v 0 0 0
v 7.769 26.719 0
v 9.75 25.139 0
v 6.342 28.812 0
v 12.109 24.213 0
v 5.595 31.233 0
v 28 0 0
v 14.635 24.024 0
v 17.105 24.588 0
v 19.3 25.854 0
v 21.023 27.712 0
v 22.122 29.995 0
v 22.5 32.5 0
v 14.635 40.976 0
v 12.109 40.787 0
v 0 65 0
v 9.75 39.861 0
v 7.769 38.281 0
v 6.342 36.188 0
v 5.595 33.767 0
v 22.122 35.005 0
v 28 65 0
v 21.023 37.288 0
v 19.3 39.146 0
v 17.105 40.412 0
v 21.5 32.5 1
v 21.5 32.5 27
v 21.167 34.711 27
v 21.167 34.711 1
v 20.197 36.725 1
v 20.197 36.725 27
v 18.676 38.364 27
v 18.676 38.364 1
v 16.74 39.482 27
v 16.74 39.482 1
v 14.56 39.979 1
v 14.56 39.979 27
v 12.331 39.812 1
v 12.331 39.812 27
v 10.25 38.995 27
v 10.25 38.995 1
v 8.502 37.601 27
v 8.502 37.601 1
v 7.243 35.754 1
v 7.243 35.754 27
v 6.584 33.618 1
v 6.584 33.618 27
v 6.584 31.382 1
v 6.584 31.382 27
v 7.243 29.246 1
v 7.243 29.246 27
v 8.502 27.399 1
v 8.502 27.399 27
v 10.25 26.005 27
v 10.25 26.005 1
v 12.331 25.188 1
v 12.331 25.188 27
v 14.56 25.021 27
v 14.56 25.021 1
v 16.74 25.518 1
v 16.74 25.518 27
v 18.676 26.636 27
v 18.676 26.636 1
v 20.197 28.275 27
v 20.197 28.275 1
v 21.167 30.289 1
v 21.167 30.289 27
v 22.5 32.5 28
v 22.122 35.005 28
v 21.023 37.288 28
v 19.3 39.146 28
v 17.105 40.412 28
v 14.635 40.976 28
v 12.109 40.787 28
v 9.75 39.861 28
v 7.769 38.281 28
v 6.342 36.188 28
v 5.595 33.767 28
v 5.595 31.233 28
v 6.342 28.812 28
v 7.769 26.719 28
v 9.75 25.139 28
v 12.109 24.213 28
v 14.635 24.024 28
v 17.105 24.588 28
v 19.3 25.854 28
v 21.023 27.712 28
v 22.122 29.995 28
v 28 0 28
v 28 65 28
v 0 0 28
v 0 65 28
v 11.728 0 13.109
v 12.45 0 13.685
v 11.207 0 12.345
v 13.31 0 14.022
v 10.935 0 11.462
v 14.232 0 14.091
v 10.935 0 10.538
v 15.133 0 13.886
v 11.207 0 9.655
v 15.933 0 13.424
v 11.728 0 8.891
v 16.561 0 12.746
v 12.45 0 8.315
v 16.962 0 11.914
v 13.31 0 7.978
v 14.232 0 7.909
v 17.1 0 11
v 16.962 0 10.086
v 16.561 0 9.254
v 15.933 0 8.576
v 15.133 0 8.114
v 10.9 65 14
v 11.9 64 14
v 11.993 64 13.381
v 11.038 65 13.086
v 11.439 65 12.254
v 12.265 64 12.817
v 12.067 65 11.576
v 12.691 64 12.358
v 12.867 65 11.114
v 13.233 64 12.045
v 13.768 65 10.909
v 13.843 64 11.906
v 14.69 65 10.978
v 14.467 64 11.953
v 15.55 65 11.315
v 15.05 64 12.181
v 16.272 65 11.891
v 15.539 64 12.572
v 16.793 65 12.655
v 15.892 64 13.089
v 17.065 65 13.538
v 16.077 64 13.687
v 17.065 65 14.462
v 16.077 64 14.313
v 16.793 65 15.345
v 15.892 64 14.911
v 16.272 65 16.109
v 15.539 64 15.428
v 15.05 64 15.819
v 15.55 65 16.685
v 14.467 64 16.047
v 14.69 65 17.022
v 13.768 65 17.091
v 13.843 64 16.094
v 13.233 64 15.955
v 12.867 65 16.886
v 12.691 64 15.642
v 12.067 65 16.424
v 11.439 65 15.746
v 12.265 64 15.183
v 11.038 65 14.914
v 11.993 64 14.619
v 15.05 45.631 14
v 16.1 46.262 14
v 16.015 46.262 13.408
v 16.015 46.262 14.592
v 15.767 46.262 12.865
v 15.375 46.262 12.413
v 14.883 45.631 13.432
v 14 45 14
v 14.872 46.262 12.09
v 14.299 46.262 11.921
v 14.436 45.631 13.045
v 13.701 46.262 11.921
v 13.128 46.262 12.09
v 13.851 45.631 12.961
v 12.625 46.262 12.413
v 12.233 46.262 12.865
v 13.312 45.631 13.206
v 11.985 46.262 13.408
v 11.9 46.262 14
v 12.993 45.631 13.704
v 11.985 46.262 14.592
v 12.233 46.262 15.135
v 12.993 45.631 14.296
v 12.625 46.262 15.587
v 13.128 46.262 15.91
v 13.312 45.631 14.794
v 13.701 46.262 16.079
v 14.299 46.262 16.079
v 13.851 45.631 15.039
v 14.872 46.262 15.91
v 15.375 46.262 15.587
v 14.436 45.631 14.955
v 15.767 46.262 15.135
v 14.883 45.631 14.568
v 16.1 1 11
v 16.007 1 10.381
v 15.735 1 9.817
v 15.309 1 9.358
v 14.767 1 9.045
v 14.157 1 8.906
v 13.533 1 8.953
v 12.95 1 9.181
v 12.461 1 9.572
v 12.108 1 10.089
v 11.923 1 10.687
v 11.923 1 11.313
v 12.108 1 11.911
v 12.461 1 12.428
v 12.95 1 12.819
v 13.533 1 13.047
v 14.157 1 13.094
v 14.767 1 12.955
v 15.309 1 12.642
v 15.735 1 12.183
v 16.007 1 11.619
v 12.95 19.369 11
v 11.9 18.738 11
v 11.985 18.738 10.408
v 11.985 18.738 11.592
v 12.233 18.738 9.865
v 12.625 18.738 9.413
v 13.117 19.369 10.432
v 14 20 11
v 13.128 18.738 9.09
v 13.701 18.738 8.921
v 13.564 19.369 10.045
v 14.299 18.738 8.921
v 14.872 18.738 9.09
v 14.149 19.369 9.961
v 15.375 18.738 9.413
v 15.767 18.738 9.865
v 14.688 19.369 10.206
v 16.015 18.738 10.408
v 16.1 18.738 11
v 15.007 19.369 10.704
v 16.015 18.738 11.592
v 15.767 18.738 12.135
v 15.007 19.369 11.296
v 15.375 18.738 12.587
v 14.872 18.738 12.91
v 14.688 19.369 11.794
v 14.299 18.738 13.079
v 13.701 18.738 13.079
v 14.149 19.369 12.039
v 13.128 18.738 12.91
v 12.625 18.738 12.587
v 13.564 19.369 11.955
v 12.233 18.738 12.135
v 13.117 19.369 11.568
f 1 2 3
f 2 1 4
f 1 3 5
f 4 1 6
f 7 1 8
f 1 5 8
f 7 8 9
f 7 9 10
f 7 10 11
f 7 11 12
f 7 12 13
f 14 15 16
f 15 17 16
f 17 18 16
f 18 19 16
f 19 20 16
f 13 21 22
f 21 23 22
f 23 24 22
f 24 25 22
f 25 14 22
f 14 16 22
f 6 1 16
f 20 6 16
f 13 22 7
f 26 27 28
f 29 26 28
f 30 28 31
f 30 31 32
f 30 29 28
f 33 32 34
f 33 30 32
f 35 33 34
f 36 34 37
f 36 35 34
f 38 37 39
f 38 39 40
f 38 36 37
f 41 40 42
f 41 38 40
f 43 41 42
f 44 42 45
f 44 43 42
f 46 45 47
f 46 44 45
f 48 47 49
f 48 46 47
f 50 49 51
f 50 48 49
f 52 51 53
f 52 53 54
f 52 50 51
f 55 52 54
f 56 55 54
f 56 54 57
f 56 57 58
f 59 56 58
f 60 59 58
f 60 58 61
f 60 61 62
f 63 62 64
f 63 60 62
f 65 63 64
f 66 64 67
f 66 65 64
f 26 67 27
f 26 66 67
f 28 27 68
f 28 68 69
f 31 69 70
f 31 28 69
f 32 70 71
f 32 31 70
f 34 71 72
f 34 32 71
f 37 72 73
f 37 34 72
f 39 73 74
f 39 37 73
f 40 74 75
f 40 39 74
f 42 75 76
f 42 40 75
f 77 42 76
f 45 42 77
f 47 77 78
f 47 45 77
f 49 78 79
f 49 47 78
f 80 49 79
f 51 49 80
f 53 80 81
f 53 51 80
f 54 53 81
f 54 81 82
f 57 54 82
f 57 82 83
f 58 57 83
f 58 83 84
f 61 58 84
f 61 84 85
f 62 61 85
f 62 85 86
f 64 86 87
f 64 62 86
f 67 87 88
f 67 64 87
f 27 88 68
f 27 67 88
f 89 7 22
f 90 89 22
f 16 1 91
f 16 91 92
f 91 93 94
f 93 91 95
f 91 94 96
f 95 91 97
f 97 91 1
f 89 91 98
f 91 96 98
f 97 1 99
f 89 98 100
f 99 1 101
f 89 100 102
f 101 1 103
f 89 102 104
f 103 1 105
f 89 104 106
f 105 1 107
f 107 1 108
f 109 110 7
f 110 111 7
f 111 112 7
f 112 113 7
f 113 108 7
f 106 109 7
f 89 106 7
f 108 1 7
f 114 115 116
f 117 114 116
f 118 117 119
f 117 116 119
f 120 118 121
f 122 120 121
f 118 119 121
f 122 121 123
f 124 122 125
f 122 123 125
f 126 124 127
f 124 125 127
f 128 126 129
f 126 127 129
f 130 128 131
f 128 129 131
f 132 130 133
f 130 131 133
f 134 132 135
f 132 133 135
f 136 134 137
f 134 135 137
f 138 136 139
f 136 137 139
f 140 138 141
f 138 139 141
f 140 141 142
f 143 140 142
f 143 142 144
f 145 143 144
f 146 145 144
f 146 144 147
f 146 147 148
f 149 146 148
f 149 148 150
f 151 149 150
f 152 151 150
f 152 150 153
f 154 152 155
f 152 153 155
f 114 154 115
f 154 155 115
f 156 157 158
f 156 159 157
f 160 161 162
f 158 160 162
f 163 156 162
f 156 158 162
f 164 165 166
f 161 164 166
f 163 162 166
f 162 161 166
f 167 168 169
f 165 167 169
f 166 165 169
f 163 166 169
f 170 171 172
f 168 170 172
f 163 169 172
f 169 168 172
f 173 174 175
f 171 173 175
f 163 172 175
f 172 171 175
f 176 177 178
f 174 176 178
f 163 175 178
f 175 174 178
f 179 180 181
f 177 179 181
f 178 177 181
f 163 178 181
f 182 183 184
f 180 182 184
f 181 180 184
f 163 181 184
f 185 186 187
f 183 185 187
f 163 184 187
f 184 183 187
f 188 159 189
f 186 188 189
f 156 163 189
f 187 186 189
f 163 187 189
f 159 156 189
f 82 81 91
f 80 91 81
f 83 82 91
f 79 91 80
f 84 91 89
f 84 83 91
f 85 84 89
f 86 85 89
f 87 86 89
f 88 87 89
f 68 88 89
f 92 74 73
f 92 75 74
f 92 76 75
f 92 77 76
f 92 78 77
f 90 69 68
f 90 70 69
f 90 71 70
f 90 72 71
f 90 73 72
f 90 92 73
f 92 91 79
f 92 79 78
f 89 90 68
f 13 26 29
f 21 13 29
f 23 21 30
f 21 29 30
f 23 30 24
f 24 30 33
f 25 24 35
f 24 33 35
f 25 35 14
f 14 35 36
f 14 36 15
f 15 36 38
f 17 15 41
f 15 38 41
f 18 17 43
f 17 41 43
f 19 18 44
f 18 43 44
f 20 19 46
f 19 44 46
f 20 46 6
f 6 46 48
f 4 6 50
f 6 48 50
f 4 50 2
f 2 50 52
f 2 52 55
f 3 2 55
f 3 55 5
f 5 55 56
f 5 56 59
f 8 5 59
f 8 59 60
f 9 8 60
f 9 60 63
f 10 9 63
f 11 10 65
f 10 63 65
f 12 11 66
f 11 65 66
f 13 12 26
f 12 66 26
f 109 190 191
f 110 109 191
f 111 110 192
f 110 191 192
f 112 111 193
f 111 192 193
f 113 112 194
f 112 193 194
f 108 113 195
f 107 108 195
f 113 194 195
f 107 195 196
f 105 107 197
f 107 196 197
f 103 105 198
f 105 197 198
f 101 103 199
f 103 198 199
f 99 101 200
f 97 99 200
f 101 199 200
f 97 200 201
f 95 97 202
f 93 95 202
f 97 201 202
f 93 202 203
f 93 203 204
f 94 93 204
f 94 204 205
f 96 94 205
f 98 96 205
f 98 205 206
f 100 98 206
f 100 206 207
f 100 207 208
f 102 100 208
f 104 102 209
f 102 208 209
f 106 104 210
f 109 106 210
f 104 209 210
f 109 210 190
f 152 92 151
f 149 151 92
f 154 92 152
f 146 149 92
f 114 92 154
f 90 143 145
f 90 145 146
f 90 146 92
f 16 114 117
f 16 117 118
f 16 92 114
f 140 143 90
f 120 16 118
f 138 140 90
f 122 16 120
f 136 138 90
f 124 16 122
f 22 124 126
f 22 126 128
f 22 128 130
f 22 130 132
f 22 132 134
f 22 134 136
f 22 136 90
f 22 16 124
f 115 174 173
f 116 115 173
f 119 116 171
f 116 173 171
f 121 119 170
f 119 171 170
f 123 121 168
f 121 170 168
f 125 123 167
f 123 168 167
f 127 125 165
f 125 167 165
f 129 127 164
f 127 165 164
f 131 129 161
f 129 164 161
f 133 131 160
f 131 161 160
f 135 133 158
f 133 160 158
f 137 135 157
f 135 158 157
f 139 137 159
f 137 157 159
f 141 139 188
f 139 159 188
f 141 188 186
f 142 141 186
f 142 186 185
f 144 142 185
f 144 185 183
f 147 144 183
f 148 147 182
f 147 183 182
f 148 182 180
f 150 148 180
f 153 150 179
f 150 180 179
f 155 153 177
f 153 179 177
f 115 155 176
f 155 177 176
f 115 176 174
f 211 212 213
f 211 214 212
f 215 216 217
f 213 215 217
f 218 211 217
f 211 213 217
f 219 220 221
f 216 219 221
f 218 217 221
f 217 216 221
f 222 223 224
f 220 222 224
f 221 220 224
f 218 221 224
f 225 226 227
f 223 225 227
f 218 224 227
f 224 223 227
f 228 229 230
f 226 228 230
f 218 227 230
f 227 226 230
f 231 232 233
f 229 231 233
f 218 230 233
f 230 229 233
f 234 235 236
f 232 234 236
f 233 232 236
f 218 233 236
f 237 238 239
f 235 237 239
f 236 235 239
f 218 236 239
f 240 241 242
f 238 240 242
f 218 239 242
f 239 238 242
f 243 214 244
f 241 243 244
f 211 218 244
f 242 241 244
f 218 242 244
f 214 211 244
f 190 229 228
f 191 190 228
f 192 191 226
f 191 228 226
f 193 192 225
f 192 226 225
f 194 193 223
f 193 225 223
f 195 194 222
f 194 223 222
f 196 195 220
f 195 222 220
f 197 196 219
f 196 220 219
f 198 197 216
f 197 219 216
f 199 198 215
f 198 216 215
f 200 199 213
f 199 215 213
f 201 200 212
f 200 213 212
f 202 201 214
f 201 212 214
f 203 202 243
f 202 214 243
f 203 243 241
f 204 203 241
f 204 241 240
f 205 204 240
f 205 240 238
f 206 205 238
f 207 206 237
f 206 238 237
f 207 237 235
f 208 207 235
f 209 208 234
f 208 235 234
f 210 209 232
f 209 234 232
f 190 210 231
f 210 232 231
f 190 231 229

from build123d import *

# Parameters (mm, degrees)
SKETCH1_W             = 28
SKETCH1_H             = 65
SKETCH1_R             = 7.5
BOSS_EXTRUDE1_DEPTH   = 28
M5_TAPPED_HOLE3_D     = 4.2
M5_TAPPED_HOLE3_DEPTH = 18.7381927
M5_TAPPED_HOLE3_TIP   = 1.2618073
M5_TAPPED_HOLE4_D     = 4.2
M5_TAPPED_HOLE4_DEPTH = 18.7381927
M5_TAPPED_HOLE4_TIP   = 1.2618073
CHAMFER1_SIZE         = 1


with BuildPart() as part:
    # Sketch1 → Boss-Extrude1 (new body)
    with BuildSketch(Plane.XY):
        with Locations((14, 32.5)):
            Rectangle(SKETCH1_W, SKETCH1_H)
        with Locations((14, 32.5)):
            Circle(SKETCH1_R, mode=Mode.SUBTRACT)
    extrude(amount=BOSS_EXTRUDE1_DEPTH)

    # M5 Tapped Hole3
    with Locations(Plane(origin=(0, 0, 0), x_dir=(-1, 0, 0), z_dir=(0, -1, 0))):
        with Locations((-14, -11)):
            Hole(M5_TAPPED_HOLE3_D / 2, depth=M5_TAPPED_HOLE3_DEPTH)
            with Locations((0, 0, -(M5_TAPPED_HOLE3_DEPTH + M5_TAPPED_HOLE3_TIP / 2))):  # 118° drill point
                Cone(0, M5_TAPPED_HOLE3_D / 2, M5_TAPPED_HOLE3_TIP, mode=Mode.SUBTRACT)

    # M5 Tapped Hole4
    with Locations(Plane(origin=(0, 65, 0), x_dir=(1, 0, 0), z_dir=(0, 1, 0))):
        with Locations((14, -14)):
            Hole(M5_TAPPED_HOLE4_D / 2, depth=M5_TAPPED_HOLE4_DEPTH)
            with Locations((0, 0, -(M5_TAPPED_HOLE4_DEPTH + M5_TAPPED_HOLE4_TIP / 2))):  # 118° drill point
                Cone(0, M5_TAPPED_HOLE4_D / 2, M5_TAPPED_HOLE4_TIP, mode=Mode.SUBTRACT)

    # Chamfer1
    chamfer1_edges = [part.edges().sort_by_distance(p)[0] for p in [
        (6.5, 32.5, 0),
        (6.5, 32.5, 28),
        (11.9, 0, 11),
        (16.1, 65, 14),
    ]]
    chamfer(chamfer1_edges, length=CHAMFER1_SIZE)


solid = part.part
